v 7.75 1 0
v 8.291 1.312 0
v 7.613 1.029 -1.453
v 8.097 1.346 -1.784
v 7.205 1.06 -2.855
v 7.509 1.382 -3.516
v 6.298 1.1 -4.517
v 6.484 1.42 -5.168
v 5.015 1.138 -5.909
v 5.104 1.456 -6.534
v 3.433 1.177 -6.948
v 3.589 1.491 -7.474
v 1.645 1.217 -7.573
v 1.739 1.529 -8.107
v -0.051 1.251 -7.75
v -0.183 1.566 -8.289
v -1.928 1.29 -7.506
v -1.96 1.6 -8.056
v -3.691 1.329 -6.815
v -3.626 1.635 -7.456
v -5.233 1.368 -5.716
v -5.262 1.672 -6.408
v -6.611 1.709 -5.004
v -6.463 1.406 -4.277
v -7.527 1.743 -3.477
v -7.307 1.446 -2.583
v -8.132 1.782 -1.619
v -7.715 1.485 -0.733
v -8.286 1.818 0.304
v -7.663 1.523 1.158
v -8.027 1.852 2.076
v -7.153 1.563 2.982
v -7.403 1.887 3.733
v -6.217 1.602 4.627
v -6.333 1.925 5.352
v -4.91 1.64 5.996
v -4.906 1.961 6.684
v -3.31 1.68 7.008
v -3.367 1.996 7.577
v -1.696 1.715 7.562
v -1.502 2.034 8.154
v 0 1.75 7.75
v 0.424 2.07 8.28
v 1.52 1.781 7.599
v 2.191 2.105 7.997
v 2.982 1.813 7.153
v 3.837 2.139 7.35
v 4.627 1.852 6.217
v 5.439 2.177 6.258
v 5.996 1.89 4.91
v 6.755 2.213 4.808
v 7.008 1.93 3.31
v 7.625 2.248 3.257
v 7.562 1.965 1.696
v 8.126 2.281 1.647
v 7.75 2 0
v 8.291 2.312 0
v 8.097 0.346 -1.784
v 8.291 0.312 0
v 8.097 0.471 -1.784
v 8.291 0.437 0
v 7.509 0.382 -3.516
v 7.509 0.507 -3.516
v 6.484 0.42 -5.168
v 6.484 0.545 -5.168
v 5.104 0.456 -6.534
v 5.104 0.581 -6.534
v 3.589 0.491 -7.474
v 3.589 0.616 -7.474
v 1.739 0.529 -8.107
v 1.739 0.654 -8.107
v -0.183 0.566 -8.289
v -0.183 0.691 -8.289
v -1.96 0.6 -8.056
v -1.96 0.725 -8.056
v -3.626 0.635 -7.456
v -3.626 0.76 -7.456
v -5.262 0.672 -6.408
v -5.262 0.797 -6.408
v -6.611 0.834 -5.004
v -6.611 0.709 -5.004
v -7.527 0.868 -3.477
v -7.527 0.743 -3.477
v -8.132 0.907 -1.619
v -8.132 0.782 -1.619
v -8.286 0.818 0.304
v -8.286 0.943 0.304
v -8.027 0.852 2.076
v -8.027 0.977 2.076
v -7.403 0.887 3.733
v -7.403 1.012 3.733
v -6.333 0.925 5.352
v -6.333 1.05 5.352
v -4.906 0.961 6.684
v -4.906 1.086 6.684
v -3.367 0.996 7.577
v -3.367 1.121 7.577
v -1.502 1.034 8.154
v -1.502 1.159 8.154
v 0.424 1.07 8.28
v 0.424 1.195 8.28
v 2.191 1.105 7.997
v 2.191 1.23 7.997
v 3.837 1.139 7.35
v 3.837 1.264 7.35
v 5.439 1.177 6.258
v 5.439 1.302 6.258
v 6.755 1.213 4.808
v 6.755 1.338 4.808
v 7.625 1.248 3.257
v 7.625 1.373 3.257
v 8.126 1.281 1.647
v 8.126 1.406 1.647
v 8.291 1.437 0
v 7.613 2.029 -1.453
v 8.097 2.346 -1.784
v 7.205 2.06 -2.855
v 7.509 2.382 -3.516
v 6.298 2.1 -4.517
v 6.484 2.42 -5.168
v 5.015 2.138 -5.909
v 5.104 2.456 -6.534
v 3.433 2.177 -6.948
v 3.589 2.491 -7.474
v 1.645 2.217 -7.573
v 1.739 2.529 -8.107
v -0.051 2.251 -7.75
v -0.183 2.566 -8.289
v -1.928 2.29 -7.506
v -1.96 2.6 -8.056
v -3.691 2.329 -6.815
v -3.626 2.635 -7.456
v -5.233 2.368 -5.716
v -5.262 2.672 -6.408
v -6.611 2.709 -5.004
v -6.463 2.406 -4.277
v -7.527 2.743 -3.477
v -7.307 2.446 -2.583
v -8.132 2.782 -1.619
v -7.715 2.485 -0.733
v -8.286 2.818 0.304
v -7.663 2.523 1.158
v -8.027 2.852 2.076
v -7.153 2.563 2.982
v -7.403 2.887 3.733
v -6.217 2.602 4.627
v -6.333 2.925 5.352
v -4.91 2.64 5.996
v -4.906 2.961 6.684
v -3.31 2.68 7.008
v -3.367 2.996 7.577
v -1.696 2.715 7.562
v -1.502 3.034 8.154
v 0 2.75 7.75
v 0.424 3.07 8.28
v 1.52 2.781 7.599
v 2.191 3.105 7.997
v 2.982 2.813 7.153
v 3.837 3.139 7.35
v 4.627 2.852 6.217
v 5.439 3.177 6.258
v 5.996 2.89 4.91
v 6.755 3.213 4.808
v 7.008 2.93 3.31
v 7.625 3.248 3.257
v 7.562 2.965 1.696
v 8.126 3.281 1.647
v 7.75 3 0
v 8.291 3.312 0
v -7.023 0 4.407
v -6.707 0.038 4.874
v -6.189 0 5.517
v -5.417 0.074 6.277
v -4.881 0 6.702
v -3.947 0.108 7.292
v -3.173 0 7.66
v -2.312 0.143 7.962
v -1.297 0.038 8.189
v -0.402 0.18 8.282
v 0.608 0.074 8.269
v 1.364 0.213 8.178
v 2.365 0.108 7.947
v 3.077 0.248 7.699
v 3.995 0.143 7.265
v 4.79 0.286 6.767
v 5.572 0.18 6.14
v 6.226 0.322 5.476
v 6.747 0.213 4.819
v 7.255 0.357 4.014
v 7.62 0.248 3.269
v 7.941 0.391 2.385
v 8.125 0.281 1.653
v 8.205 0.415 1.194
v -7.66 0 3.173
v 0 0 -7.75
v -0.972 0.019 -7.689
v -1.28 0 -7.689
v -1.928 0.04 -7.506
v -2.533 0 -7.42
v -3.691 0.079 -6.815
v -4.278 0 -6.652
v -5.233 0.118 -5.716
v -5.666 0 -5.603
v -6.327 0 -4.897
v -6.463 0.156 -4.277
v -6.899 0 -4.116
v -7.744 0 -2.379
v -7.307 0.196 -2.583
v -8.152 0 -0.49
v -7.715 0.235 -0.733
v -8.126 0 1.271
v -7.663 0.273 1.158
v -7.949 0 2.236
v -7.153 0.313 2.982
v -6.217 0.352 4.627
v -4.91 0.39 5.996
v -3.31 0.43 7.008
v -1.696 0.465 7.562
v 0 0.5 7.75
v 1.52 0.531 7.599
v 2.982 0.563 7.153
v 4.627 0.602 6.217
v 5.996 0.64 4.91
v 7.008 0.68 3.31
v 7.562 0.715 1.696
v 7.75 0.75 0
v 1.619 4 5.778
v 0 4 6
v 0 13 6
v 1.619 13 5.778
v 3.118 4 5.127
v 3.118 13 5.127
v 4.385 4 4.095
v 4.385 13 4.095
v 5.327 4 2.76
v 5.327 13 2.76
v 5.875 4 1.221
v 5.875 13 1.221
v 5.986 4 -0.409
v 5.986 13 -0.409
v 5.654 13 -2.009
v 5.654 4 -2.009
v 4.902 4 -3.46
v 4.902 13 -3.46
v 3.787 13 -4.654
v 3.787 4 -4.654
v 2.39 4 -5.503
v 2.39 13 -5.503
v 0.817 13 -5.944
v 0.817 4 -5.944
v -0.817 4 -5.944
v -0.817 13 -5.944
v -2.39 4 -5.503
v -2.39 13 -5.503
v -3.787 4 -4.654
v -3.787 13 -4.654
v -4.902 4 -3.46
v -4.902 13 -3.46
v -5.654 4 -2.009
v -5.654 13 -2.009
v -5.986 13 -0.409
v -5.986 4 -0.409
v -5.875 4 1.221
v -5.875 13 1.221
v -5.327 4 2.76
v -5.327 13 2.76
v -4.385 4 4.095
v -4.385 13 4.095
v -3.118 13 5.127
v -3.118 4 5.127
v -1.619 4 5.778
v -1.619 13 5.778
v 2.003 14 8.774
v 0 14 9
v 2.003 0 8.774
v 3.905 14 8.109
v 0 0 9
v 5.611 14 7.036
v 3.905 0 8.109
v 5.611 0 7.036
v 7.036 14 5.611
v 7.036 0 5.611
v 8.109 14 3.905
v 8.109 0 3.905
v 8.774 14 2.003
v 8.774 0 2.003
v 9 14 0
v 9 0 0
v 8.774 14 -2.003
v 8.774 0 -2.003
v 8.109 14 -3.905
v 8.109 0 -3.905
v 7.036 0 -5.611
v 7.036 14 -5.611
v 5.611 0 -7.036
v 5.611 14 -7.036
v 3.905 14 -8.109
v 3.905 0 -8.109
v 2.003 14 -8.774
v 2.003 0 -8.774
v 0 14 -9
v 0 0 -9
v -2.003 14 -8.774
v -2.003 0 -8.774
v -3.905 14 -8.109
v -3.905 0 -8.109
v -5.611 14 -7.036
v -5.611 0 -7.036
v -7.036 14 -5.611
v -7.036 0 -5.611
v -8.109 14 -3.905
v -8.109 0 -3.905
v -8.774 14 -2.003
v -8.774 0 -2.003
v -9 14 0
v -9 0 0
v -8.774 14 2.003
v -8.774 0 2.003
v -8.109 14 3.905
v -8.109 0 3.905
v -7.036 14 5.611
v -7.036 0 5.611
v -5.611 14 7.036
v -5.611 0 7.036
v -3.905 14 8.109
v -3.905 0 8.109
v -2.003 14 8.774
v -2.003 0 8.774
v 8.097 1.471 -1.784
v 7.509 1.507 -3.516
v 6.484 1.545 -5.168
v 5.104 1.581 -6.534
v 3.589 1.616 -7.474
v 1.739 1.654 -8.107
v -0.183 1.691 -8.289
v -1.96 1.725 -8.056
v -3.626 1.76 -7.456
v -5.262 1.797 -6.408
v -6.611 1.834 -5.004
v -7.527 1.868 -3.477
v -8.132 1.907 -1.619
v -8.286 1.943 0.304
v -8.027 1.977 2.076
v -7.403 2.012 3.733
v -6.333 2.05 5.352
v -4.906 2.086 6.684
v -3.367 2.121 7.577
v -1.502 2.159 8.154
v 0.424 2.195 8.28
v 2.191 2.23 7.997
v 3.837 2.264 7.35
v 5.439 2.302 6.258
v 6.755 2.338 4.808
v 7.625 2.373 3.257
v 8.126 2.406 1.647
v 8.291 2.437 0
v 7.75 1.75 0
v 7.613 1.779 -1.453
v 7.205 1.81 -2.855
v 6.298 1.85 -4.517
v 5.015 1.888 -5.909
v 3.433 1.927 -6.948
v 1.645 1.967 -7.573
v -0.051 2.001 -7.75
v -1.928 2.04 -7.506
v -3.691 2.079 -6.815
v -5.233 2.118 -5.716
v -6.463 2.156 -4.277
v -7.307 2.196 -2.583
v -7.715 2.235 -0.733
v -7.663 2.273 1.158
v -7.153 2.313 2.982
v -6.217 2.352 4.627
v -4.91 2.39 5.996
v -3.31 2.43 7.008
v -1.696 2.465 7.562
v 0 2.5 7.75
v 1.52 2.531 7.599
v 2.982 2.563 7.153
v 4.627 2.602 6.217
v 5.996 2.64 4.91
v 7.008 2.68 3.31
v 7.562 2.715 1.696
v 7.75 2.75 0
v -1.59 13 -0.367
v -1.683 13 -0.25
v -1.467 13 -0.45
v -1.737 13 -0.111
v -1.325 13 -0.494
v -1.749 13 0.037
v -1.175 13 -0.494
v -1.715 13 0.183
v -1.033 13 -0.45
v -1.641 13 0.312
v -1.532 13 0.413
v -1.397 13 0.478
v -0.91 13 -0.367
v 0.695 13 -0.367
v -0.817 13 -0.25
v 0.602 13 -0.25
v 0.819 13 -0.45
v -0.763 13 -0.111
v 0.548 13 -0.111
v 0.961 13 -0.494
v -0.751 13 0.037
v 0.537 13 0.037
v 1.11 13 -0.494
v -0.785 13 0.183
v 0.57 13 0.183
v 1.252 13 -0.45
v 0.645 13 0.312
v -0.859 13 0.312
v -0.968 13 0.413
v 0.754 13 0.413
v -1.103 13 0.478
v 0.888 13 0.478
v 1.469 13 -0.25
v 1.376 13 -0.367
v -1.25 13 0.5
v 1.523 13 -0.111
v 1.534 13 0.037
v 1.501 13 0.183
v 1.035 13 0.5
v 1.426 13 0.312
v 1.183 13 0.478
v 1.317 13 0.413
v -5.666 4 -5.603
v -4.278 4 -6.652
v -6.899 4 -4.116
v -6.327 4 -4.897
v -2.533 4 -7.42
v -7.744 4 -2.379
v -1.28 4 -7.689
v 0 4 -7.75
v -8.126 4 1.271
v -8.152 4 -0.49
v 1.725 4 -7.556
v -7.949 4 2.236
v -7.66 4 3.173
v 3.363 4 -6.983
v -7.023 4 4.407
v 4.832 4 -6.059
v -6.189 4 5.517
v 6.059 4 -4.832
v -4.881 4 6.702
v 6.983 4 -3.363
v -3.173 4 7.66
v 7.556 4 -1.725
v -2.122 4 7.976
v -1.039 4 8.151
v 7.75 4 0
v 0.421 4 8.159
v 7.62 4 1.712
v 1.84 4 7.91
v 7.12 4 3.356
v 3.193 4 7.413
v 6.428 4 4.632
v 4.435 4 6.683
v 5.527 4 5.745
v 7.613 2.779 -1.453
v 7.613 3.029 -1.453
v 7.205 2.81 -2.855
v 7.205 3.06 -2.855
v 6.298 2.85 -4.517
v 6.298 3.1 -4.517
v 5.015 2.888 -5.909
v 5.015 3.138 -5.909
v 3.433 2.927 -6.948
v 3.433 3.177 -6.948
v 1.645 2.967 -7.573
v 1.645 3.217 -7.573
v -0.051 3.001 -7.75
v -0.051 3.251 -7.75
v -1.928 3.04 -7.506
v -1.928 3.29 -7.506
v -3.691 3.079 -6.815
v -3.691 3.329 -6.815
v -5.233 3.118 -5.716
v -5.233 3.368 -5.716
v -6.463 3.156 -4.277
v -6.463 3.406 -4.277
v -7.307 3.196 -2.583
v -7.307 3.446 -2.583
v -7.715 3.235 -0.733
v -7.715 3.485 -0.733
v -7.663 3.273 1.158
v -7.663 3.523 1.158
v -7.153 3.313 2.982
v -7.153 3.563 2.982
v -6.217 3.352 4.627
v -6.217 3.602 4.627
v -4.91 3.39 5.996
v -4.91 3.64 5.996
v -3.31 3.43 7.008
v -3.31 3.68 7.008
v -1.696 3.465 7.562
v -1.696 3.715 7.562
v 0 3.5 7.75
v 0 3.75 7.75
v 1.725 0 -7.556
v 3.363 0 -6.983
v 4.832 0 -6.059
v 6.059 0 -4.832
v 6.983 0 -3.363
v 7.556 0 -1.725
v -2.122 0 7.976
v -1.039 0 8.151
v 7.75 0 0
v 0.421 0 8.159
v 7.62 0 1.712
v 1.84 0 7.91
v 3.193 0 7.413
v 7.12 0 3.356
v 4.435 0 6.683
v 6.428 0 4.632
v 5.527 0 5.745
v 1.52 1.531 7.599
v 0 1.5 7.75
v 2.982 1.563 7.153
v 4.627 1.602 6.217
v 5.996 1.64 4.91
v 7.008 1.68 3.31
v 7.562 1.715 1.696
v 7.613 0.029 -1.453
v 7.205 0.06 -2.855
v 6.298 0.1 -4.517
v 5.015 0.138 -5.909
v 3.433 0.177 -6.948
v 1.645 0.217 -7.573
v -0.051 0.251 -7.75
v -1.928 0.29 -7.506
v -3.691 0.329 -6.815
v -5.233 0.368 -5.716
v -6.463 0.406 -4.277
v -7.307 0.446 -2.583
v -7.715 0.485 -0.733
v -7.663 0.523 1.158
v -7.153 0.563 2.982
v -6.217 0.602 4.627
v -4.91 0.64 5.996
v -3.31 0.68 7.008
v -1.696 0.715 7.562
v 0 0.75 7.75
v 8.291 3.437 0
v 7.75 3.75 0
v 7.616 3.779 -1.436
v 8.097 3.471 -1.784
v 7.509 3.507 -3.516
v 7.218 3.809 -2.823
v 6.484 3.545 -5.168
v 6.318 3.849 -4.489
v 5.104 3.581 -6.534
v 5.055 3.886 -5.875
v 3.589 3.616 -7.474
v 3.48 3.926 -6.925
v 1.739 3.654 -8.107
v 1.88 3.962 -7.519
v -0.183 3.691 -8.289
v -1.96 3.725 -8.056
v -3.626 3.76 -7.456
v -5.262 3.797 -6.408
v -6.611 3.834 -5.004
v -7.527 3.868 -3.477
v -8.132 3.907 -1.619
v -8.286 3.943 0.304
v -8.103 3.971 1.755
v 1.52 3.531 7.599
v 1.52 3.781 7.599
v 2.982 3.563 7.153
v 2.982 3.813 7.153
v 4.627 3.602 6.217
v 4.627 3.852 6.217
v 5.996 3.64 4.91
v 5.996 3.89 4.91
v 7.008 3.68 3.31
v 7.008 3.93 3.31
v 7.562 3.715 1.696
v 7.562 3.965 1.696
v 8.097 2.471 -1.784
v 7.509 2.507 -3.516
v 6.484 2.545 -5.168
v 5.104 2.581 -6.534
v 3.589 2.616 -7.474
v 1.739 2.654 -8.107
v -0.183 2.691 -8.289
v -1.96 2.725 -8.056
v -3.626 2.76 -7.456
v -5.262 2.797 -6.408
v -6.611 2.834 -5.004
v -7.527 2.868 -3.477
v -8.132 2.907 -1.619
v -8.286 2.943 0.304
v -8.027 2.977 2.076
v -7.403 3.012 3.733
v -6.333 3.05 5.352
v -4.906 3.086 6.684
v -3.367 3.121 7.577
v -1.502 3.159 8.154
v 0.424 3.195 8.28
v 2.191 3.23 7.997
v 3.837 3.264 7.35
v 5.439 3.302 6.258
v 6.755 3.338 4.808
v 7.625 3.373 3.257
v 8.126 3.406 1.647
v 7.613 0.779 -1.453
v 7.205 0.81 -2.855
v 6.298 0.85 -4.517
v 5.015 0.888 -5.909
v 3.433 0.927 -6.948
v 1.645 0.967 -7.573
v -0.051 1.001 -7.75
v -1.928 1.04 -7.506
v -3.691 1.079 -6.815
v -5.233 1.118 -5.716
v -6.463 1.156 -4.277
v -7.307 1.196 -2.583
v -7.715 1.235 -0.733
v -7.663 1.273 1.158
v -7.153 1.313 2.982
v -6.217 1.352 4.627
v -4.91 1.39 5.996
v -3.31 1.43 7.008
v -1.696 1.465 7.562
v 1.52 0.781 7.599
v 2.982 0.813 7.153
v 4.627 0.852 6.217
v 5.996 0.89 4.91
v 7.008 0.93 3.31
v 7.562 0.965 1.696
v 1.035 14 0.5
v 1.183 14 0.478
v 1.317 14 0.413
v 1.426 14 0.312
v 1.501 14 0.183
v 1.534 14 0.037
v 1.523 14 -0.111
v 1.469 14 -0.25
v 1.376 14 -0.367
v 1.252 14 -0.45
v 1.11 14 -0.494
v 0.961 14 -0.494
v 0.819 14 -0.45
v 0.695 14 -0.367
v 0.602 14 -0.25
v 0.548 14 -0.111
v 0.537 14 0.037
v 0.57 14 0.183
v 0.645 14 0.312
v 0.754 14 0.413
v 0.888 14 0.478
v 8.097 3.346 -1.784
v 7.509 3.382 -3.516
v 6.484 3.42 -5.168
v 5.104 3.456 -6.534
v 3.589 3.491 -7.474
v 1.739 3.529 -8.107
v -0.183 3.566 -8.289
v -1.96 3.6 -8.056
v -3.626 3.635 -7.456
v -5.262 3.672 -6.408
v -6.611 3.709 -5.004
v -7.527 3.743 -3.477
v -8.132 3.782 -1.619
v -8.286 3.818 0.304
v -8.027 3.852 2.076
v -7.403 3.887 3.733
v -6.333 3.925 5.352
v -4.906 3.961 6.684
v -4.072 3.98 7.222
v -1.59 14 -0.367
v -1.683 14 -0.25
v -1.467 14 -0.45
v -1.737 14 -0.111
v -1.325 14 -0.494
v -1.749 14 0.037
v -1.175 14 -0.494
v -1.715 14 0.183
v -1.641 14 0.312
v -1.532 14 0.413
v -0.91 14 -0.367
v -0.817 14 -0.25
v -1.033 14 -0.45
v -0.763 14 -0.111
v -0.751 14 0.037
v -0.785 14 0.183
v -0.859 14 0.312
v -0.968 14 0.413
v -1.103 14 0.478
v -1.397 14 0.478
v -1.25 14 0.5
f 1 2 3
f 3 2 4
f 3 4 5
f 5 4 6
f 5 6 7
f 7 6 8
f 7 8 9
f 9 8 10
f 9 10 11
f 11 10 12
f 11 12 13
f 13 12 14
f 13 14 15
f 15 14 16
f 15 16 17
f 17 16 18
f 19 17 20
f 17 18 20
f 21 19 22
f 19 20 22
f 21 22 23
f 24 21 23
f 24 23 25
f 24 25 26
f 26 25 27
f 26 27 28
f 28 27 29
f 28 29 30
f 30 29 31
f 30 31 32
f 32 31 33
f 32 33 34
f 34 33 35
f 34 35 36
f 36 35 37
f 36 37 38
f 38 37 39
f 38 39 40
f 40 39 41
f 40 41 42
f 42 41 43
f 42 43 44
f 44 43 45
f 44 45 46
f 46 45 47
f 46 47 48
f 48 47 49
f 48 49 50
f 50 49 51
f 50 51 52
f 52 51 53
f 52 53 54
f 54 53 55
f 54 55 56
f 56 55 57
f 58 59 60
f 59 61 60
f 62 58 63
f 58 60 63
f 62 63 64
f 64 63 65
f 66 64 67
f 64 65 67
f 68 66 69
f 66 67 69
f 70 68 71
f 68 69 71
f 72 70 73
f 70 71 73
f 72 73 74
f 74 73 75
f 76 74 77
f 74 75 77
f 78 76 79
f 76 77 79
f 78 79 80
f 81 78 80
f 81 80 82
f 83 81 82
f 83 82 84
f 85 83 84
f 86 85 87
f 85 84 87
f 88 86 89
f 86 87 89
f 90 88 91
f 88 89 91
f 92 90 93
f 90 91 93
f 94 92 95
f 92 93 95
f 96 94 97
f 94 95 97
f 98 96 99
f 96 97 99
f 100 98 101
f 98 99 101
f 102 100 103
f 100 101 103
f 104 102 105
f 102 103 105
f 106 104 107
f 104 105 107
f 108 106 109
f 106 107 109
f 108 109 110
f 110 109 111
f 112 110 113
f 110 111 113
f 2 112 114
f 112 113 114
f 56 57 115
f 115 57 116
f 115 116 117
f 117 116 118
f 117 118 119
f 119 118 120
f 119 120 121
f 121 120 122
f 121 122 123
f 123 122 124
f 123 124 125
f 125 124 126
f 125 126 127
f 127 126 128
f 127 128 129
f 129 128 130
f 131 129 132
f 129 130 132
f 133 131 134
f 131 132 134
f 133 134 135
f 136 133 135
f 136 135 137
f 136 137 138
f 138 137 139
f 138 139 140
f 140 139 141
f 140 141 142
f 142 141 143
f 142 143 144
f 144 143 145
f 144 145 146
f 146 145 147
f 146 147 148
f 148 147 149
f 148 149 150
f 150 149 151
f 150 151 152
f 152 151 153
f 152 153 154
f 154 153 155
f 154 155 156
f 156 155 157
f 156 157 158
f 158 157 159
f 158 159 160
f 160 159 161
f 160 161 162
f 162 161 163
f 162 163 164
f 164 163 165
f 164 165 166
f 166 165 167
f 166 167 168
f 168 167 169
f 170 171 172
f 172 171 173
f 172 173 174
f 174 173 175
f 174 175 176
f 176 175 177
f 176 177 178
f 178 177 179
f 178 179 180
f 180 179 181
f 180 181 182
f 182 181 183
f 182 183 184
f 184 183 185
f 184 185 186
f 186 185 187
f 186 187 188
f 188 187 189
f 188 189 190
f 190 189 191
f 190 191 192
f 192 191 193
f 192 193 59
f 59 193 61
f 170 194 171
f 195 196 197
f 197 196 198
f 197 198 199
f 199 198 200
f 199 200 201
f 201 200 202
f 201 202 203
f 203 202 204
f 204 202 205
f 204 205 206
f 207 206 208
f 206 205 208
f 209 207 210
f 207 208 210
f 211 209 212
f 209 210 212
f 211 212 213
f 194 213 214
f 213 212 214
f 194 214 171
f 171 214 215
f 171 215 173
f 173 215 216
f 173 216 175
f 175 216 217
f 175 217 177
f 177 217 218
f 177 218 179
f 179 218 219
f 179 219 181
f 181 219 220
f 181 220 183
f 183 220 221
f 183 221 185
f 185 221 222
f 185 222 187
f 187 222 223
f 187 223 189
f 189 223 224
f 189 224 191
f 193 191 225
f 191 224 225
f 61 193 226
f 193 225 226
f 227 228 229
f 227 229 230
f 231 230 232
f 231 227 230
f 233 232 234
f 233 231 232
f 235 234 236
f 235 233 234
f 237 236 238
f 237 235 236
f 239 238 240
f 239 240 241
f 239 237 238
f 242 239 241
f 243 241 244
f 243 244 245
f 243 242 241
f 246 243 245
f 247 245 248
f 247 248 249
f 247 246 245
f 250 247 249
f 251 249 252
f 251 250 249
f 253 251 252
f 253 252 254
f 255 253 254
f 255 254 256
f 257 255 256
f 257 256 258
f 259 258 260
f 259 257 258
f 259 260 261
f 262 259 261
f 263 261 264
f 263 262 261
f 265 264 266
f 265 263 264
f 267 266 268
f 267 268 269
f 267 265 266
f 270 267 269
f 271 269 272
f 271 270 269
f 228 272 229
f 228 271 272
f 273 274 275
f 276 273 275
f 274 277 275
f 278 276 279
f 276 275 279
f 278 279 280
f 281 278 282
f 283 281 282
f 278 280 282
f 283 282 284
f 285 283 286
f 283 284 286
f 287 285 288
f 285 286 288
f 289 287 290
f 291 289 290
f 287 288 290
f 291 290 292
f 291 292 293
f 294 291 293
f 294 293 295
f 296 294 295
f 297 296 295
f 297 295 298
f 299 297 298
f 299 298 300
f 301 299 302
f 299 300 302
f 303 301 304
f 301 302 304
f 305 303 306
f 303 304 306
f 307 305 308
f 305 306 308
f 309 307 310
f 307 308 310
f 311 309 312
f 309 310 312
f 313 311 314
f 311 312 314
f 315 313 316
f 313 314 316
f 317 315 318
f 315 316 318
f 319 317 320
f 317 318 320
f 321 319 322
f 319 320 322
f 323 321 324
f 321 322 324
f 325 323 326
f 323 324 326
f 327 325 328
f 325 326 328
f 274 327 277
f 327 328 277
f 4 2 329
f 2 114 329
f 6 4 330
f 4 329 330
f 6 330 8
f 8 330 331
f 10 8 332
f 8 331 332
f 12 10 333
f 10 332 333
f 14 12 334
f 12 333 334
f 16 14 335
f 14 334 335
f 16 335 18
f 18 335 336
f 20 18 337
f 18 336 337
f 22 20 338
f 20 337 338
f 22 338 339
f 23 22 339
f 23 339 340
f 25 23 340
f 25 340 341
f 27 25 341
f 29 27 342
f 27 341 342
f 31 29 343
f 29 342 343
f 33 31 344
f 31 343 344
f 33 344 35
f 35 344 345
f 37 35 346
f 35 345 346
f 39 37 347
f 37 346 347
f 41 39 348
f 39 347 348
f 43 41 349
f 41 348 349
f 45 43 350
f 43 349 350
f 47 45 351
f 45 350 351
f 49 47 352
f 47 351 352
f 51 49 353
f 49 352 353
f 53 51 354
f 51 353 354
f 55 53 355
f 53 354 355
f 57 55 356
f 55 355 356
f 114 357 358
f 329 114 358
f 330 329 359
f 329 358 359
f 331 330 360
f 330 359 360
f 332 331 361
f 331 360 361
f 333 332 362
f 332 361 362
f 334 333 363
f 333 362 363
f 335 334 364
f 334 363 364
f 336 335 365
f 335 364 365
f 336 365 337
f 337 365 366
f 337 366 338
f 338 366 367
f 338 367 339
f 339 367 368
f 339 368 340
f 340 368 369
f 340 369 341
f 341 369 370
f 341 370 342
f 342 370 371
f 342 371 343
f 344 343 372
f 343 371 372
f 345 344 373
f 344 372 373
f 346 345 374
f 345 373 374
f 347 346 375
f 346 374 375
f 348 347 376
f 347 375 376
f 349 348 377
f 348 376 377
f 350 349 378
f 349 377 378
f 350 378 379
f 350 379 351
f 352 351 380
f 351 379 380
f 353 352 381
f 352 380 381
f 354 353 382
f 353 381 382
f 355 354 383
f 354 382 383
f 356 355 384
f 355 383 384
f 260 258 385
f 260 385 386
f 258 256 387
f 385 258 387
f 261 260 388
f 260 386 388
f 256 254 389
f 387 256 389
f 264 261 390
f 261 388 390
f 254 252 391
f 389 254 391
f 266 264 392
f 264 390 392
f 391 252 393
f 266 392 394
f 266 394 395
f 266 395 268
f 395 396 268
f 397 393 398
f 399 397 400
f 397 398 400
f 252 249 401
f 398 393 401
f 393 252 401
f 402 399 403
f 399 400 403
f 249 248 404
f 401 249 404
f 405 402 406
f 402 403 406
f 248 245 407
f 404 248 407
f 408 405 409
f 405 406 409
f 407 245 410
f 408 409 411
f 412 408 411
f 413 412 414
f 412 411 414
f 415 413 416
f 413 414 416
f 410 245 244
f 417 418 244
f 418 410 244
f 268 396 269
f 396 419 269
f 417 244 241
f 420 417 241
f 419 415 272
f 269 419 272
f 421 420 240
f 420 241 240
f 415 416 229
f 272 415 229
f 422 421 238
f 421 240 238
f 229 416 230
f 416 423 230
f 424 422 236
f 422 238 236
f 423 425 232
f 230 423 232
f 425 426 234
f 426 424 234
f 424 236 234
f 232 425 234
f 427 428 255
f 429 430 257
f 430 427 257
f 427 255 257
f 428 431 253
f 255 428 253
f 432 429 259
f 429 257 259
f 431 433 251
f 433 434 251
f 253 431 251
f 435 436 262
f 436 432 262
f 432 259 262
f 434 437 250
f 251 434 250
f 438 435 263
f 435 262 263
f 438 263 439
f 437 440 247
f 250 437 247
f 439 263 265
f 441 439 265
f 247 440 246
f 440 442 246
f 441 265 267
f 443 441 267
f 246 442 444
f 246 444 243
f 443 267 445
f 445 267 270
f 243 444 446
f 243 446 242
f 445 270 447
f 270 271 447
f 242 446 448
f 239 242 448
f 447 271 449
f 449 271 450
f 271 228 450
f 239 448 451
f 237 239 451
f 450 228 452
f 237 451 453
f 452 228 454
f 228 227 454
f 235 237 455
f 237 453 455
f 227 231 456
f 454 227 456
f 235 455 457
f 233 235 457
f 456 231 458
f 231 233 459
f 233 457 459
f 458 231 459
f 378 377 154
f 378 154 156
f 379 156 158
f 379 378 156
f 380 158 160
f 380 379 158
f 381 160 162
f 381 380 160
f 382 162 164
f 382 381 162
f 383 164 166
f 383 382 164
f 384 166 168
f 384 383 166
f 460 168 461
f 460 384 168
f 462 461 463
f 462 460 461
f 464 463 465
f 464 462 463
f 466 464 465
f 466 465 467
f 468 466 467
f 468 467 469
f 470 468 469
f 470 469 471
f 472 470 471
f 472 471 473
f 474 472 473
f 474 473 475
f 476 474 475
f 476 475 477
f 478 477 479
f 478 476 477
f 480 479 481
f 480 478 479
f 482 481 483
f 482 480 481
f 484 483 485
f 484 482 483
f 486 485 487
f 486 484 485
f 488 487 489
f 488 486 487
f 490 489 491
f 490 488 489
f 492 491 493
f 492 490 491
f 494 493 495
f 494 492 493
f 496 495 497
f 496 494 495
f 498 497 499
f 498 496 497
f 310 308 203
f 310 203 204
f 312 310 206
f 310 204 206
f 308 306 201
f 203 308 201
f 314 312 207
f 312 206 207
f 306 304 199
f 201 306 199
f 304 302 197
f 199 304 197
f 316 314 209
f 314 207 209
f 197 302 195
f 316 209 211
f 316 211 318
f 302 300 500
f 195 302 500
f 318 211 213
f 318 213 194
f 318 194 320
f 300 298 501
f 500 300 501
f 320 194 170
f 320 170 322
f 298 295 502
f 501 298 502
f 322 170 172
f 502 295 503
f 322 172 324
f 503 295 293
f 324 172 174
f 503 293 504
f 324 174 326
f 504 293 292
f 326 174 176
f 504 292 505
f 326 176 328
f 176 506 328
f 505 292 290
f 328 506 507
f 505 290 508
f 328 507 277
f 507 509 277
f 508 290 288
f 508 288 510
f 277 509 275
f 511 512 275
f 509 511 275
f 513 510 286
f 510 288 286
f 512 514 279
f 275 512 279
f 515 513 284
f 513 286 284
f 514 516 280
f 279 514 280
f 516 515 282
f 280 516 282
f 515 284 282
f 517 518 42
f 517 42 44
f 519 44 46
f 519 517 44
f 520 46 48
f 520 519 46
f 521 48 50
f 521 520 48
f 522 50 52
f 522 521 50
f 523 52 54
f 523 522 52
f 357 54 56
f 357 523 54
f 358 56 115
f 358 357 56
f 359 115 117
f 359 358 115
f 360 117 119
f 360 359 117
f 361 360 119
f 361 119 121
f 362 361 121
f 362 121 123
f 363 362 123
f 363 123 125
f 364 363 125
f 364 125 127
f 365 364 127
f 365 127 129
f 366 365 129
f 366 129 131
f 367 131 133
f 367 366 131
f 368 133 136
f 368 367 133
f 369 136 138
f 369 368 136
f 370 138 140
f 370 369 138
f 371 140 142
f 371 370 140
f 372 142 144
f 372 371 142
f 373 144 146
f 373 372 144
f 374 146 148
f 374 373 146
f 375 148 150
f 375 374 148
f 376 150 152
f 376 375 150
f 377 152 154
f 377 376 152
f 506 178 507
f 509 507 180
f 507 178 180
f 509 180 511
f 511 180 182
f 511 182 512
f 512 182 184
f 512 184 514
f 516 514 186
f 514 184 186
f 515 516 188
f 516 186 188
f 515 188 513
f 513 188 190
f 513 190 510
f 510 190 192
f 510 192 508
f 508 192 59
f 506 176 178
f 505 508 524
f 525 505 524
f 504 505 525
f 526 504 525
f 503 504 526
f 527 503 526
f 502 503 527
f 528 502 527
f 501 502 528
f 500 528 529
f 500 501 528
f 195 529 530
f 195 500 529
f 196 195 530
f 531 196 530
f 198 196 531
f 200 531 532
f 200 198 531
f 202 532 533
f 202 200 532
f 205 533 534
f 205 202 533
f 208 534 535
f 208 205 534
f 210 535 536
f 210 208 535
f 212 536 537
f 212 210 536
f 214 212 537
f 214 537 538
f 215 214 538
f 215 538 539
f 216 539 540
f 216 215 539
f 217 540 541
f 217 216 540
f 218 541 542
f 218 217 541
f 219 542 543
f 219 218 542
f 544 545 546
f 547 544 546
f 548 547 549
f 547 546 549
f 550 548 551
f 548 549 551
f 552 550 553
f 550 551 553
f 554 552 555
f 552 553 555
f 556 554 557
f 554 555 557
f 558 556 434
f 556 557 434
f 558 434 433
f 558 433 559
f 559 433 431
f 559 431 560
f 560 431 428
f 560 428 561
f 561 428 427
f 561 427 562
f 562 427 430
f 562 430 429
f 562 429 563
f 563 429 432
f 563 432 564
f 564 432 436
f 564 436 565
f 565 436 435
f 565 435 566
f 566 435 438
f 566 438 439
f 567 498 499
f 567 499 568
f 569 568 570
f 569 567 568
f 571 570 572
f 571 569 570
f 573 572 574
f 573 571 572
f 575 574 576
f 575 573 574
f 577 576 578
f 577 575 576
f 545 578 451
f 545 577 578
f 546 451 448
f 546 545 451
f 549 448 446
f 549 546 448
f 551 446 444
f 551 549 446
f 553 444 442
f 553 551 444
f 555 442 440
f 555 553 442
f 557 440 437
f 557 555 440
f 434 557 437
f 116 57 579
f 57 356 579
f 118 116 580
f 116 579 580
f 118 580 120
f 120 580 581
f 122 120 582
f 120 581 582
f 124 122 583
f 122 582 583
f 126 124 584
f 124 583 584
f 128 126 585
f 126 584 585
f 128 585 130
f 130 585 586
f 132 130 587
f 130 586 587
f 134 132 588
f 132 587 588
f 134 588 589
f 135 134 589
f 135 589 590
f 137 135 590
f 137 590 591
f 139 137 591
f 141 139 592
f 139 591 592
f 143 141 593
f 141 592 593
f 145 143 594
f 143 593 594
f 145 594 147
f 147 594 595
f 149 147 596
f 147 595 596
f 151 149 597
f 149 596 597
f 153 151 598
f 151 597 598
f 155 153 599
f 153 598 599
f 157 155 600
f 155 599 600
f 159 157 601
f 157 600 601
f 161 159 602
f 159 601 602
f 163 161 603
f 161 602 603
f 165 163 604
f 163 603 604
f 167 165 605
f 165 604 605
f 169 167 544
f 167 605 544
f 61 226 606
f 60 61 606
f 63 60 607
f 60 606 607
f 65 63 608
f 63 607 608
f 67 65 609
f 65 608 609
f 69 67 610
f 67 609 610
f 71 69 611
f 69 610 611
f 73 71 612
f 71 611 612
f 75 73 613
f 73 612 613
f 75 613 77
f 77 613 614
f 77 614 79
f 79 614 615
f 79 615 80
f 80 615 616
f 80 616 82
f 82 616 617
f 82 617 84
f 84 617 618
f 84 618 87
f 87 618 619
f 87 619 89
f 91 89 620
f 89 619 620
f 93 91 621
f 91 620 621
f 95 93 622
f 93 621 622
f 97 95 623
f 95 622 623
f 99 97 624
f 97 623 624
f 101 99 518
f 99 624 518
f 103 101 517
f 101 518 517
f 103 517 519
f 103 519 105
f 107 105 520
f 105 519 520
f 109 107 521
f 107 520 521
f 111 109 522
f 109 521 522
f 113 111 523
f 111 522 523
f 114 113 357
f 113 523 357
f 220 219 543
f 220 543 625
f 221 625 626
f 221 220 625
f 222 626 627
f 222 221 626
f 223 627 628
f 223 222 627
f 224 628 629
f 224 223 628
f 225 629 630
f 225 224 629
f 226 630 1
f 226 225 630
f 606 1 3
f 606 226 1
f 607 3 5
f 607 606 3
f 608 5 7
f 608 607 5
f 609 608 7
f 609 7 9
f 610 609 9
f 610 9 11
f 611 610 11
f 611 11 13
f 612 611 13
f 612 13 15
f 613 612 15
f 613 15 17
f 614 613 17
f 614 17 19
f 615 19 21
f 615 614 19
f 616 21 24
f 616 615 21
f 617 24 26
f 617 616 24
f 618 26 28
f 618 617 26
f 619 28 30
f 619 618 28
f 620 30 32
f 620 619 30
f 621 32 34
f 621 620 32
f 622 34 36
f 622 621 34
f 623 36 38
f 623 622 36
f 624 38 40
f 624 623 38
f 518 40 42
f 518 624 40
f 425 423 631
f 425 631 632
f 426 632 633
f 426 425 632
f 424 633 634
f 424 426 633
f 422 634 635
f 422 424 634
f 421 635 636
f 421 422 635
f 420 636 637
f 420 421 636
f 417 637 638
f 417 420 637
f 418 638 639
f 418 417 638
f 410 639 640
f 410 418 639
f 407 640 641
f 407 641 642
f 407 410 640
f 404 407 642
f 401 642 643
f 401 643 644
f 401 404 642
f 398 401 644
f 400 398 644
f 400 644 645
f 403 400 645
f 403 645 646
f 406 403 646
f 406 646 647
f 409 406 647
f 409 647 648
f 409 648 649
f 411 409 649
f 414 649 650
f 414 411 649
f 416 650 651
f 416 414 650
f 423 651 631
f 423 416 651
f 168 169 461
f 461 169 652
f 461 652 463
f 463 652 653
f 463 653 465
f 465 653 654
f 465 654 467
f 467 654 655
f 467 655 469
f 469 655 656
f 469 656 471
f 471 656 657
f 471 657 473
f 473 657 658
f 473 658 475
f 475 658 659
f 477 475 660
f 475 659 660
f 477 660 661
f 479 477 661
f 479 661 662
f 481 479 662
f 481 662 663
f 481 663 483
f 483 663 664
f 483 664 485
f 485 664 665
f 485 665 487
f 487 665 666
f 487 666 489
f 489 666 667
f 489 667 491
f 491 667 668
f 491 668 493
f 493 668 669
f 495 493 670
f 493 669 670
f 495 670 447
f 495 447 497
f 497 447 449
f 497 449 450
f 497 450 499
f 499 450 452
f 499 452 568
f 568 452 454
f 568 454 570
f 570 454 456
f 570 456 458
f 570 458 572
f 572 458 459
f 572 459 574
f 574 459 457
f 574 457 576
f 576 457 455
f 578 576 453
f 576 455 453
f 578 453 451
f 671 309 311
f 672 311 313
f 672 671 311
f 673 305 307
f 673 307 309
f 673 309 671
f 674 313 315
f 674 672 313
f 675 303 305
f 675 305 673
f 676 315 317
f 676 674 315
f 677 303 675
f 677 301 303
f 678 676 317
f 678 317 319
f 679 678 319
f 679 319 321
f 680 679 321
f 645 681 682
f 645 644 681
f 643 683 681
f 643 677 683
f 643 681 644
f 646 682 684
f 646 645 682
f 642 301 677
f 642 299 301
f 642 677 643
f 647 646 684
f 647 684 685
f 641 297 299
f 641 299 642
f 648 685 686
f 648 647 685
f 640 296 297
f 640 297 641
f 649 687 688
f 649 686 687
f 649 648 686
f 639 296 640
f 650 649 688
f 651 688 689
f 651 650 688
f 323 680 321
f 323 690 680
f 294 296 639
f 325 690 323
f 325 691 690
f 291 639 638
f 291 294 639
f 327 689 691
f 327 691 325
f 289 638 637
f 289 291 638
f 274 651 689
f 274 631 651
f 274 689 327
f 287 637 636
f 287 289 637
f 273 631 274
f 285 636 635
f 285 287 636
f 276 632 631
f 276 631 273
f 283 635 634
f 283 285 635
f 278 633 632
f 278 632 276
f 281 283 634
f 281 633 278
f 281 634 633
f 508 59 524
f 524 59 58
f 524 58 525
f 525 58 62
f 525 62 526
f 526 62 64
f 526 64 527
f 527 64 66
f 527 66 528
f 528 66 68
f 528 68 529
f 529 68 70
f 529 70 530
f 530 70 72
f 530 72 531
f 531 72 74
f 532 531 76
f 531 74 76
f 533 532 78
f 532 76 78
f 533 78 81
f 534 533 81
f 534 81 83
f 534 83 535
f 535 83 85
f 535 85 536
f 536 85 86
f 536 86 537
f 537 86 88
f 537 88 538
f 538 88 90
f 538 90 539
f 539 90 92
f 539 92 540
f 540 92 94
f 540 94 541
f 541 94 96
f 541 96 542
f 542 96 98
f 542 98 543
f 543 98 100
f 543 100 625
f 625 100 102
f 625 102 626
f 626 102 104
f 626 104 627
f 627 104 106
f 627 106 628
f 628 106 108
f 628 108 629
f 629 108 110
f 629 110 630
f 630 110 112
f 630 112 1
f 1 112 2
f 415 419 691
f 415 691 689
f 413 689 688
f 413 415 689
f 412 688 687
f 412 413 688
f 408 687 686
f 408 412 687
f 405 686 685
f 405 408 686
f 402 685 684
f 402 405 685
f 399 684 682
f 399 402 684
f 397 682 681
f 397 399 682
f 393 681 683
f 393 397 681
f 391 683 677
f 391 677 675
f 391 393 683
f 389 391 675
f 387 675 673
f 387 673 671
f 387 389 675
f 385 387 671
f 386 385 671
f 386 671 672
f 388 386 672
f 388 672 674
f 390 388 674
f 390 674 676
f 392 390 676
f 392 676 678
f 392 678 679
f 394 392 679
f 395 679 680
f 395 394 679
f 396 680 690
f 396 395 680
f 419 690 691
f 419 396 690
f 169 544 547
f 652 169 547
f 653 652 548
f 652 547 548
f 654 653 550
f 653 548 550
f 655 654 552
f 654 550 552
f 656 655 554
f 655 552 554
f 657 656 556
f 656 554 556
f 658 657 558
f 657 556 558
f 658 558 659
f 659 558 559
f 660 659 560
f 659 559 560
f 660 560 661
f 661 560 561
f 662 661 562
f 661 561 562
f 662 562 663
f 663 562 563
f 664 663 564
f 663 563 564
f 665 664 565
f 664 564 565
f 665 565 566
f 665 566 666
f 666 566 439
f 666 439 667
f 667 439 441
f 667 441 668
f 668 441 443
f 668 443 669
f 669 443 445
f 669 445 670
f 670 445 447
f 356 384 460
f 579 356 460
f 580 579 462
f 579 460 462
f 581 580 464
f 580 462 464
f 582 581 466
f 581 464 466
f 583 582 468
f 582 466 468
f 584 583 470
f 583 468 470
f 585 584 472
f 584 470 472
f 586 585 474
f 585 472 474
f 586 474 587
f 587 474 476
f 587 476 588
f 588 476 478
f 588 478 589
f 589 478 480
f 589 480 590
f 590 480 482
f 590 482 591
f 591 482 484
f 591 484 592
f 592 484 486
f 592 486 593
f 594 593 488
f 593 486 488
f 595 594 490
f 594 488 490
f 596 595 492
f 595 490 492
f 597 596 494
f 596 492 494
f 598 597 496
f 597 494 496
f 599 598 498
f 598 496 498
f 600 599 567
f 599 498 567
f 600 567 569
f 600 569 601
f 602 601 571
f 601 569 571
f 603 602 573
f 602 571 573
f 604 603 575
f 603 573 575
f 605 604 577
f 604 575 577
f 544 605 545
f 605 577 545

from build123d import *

# Parameters (mm, degrees)
SKETCH1_R           = 9
SKETCH1_R_2         = 7.75
BOSS_EXTRUDE1_DEPTH = 4
SKETCH2_R           = 9
SKETCH2_R_2         = 6
BOSS_EXTRUDE2_DEPTH = 9
THREAD2_PITCH       = 1
THREAD2_TO          = 5
SKETCH3_R           = 9
SKETCH3_R_2         = 0.5
BOSS_EXTRUDE3_DEPTH = 1


with BuildPart() as part:
    # Sketch1 → Boss-Extrude1 (new body)
    with BuildSketch(Plane(origin=(0, 0, 0), x_dir=(1, 0, 0), z_dir=(0, 1, 0))):
        with Locations(Location((0, 0, 0), (0, 0, 270))):
            Circle(SKETCH1_R)
        with Locations(Location((0, 0, 0), (0, 0, 270))):
            Circle(SKETCH1_R_2, mode=Mode.SUBTRACT)
    extrude(amount=BOSS_EXTRUDE1_DEPTH)

    # Sketch2 → Boss-Extrude2 (add)
    with BuildSketch(Plane(origin=(0, 4, 0), x_dir=(1, 0, 0), z_dir=(0, 1, 0))):
        with Locations(Location((0, 0, 0), (0, 0, 270))):
            Circle(SKETCH2_R)
        with Locations(Location((0, 0, 0), (0, 0, 270))):
            Circle(SKETCH2_R_2, mode=Mode.SUBTRACT)
    extrude(amount=BOSS_EXTRUDE2_DEPTH)

    # Thread2: arcs per turn and ends read off the stored shape
    # Thread2: the profile of Thread Profile2 profile screwed along a right-hand helix through 5 turns, 8 arcs to a turn; built about Z, then put on its axis
    thread2_z = Axis((0, 0, 0), (0, 0, 1))
    thread2_corners = [(7.7497, 0, -0.000173205), (8.291265875, 0, 0.312499999), (8.291265875, 0, 0.437499999), (7.7497, 0, 0.750173202)]
    with BuildLine(mode=Mode.PRIVATE) as thread2_profile:
        Line(thread2_corners[0], thread2_corners[1])
        Line(thread2_corners[1], thread2_corners[2])
        Line(thread2_corners[2], thread2_corners[3])
        Line(thread2_corners[3], thread2_corners[0])
    thread2_cap = Face(thread2_profile.wire())
    thread2_turn_angles = [0, 22.5, 45, 67.5, 90, 112.5, 135, 157.5, 180, 202.5, 225, 247.5, 270, 292.5, 315, 337.5, 360]
    thread2_turn_weights = [1, 0.9238795325112867, 1, 0.9238795325112867, 1, 0.9238795325112867, 1, 0.9238795325112867, 1, 0.9238795325112867, 1, 0.9238795325112867, 1, 0.9238795325112867, 1, 0.9238795325112867, 1]
    thread2_turn_rails = [Edge.make_bspline([Vector(p[0], p[1], 0).rotate(thread2_z, thread2_turn_angles[k]) / thread2_turn_weights[k] + Vector(0, 0, p[2] + THREAD2_PITCH * thread2_turn_angles[k] / 360) for k in range(17)], [0, 0, 0, 1, 1, 2, 2, 3, 3, 4, 4, 5, 5, 6, 6, 7, 7, 8, 8, 8], 2, thread2_turn_weights) for p in thread2_corners]
    thread2_turn_sides = [Face.make_surface_from_curves(thread2_turn_rails[p[0]], thread2_turn_rails[p[1]]) for p in [(0, 1), (1, 2), (2, 3), (3, 0)]]
    thread2 = Plane(origin=(0, -1, 0), x_dir=(1, 0, 0), z_dir=(0, 1, 0)) * split(Solid(Shell([*[p.moved(Location((0, 0, THREAD2_PITCH * i))) for i in range(5) for p in thread2_turn_sides], thread2_cap, thread2_cap.rotate(thread2_z, 1800).moved(Location((0, 0, THREAD2_PITCH * 1800 / 360)))])), bisect_by=Plane.XY.offset(THREAD2_TO), keep=Keep.BOTTOM, mode=Mode.PRIVATE)
    add(thread2, mode=Mode.SUBTRACT)

    # Sketch3 → Boss-Extrude3 (add)
    with BuildSketch(Plane(origin=(0, 13, 0), x_dir=(1, 0, 0), z_dir=(0, 1, 0))):
        with Locations(Location((0, 0, 0), (0, 0, 270))):
            Circle(SKETCH3_R)
        with Locations(Location((-1.25, 0, 0), (0, 0, 270))):
            Circle(SKETCH3_R_2, mode=Mode.SUBTRACT)
        with Locations(Location((1.035492966, 0, 0), (0, 0, 270))):
            Circle(SKETCH3_R_2, mode=Mode.SUBTRACT)
    extrude(amount=BOSS_EXTRUDE3_DEPTH)


solid = part.part
